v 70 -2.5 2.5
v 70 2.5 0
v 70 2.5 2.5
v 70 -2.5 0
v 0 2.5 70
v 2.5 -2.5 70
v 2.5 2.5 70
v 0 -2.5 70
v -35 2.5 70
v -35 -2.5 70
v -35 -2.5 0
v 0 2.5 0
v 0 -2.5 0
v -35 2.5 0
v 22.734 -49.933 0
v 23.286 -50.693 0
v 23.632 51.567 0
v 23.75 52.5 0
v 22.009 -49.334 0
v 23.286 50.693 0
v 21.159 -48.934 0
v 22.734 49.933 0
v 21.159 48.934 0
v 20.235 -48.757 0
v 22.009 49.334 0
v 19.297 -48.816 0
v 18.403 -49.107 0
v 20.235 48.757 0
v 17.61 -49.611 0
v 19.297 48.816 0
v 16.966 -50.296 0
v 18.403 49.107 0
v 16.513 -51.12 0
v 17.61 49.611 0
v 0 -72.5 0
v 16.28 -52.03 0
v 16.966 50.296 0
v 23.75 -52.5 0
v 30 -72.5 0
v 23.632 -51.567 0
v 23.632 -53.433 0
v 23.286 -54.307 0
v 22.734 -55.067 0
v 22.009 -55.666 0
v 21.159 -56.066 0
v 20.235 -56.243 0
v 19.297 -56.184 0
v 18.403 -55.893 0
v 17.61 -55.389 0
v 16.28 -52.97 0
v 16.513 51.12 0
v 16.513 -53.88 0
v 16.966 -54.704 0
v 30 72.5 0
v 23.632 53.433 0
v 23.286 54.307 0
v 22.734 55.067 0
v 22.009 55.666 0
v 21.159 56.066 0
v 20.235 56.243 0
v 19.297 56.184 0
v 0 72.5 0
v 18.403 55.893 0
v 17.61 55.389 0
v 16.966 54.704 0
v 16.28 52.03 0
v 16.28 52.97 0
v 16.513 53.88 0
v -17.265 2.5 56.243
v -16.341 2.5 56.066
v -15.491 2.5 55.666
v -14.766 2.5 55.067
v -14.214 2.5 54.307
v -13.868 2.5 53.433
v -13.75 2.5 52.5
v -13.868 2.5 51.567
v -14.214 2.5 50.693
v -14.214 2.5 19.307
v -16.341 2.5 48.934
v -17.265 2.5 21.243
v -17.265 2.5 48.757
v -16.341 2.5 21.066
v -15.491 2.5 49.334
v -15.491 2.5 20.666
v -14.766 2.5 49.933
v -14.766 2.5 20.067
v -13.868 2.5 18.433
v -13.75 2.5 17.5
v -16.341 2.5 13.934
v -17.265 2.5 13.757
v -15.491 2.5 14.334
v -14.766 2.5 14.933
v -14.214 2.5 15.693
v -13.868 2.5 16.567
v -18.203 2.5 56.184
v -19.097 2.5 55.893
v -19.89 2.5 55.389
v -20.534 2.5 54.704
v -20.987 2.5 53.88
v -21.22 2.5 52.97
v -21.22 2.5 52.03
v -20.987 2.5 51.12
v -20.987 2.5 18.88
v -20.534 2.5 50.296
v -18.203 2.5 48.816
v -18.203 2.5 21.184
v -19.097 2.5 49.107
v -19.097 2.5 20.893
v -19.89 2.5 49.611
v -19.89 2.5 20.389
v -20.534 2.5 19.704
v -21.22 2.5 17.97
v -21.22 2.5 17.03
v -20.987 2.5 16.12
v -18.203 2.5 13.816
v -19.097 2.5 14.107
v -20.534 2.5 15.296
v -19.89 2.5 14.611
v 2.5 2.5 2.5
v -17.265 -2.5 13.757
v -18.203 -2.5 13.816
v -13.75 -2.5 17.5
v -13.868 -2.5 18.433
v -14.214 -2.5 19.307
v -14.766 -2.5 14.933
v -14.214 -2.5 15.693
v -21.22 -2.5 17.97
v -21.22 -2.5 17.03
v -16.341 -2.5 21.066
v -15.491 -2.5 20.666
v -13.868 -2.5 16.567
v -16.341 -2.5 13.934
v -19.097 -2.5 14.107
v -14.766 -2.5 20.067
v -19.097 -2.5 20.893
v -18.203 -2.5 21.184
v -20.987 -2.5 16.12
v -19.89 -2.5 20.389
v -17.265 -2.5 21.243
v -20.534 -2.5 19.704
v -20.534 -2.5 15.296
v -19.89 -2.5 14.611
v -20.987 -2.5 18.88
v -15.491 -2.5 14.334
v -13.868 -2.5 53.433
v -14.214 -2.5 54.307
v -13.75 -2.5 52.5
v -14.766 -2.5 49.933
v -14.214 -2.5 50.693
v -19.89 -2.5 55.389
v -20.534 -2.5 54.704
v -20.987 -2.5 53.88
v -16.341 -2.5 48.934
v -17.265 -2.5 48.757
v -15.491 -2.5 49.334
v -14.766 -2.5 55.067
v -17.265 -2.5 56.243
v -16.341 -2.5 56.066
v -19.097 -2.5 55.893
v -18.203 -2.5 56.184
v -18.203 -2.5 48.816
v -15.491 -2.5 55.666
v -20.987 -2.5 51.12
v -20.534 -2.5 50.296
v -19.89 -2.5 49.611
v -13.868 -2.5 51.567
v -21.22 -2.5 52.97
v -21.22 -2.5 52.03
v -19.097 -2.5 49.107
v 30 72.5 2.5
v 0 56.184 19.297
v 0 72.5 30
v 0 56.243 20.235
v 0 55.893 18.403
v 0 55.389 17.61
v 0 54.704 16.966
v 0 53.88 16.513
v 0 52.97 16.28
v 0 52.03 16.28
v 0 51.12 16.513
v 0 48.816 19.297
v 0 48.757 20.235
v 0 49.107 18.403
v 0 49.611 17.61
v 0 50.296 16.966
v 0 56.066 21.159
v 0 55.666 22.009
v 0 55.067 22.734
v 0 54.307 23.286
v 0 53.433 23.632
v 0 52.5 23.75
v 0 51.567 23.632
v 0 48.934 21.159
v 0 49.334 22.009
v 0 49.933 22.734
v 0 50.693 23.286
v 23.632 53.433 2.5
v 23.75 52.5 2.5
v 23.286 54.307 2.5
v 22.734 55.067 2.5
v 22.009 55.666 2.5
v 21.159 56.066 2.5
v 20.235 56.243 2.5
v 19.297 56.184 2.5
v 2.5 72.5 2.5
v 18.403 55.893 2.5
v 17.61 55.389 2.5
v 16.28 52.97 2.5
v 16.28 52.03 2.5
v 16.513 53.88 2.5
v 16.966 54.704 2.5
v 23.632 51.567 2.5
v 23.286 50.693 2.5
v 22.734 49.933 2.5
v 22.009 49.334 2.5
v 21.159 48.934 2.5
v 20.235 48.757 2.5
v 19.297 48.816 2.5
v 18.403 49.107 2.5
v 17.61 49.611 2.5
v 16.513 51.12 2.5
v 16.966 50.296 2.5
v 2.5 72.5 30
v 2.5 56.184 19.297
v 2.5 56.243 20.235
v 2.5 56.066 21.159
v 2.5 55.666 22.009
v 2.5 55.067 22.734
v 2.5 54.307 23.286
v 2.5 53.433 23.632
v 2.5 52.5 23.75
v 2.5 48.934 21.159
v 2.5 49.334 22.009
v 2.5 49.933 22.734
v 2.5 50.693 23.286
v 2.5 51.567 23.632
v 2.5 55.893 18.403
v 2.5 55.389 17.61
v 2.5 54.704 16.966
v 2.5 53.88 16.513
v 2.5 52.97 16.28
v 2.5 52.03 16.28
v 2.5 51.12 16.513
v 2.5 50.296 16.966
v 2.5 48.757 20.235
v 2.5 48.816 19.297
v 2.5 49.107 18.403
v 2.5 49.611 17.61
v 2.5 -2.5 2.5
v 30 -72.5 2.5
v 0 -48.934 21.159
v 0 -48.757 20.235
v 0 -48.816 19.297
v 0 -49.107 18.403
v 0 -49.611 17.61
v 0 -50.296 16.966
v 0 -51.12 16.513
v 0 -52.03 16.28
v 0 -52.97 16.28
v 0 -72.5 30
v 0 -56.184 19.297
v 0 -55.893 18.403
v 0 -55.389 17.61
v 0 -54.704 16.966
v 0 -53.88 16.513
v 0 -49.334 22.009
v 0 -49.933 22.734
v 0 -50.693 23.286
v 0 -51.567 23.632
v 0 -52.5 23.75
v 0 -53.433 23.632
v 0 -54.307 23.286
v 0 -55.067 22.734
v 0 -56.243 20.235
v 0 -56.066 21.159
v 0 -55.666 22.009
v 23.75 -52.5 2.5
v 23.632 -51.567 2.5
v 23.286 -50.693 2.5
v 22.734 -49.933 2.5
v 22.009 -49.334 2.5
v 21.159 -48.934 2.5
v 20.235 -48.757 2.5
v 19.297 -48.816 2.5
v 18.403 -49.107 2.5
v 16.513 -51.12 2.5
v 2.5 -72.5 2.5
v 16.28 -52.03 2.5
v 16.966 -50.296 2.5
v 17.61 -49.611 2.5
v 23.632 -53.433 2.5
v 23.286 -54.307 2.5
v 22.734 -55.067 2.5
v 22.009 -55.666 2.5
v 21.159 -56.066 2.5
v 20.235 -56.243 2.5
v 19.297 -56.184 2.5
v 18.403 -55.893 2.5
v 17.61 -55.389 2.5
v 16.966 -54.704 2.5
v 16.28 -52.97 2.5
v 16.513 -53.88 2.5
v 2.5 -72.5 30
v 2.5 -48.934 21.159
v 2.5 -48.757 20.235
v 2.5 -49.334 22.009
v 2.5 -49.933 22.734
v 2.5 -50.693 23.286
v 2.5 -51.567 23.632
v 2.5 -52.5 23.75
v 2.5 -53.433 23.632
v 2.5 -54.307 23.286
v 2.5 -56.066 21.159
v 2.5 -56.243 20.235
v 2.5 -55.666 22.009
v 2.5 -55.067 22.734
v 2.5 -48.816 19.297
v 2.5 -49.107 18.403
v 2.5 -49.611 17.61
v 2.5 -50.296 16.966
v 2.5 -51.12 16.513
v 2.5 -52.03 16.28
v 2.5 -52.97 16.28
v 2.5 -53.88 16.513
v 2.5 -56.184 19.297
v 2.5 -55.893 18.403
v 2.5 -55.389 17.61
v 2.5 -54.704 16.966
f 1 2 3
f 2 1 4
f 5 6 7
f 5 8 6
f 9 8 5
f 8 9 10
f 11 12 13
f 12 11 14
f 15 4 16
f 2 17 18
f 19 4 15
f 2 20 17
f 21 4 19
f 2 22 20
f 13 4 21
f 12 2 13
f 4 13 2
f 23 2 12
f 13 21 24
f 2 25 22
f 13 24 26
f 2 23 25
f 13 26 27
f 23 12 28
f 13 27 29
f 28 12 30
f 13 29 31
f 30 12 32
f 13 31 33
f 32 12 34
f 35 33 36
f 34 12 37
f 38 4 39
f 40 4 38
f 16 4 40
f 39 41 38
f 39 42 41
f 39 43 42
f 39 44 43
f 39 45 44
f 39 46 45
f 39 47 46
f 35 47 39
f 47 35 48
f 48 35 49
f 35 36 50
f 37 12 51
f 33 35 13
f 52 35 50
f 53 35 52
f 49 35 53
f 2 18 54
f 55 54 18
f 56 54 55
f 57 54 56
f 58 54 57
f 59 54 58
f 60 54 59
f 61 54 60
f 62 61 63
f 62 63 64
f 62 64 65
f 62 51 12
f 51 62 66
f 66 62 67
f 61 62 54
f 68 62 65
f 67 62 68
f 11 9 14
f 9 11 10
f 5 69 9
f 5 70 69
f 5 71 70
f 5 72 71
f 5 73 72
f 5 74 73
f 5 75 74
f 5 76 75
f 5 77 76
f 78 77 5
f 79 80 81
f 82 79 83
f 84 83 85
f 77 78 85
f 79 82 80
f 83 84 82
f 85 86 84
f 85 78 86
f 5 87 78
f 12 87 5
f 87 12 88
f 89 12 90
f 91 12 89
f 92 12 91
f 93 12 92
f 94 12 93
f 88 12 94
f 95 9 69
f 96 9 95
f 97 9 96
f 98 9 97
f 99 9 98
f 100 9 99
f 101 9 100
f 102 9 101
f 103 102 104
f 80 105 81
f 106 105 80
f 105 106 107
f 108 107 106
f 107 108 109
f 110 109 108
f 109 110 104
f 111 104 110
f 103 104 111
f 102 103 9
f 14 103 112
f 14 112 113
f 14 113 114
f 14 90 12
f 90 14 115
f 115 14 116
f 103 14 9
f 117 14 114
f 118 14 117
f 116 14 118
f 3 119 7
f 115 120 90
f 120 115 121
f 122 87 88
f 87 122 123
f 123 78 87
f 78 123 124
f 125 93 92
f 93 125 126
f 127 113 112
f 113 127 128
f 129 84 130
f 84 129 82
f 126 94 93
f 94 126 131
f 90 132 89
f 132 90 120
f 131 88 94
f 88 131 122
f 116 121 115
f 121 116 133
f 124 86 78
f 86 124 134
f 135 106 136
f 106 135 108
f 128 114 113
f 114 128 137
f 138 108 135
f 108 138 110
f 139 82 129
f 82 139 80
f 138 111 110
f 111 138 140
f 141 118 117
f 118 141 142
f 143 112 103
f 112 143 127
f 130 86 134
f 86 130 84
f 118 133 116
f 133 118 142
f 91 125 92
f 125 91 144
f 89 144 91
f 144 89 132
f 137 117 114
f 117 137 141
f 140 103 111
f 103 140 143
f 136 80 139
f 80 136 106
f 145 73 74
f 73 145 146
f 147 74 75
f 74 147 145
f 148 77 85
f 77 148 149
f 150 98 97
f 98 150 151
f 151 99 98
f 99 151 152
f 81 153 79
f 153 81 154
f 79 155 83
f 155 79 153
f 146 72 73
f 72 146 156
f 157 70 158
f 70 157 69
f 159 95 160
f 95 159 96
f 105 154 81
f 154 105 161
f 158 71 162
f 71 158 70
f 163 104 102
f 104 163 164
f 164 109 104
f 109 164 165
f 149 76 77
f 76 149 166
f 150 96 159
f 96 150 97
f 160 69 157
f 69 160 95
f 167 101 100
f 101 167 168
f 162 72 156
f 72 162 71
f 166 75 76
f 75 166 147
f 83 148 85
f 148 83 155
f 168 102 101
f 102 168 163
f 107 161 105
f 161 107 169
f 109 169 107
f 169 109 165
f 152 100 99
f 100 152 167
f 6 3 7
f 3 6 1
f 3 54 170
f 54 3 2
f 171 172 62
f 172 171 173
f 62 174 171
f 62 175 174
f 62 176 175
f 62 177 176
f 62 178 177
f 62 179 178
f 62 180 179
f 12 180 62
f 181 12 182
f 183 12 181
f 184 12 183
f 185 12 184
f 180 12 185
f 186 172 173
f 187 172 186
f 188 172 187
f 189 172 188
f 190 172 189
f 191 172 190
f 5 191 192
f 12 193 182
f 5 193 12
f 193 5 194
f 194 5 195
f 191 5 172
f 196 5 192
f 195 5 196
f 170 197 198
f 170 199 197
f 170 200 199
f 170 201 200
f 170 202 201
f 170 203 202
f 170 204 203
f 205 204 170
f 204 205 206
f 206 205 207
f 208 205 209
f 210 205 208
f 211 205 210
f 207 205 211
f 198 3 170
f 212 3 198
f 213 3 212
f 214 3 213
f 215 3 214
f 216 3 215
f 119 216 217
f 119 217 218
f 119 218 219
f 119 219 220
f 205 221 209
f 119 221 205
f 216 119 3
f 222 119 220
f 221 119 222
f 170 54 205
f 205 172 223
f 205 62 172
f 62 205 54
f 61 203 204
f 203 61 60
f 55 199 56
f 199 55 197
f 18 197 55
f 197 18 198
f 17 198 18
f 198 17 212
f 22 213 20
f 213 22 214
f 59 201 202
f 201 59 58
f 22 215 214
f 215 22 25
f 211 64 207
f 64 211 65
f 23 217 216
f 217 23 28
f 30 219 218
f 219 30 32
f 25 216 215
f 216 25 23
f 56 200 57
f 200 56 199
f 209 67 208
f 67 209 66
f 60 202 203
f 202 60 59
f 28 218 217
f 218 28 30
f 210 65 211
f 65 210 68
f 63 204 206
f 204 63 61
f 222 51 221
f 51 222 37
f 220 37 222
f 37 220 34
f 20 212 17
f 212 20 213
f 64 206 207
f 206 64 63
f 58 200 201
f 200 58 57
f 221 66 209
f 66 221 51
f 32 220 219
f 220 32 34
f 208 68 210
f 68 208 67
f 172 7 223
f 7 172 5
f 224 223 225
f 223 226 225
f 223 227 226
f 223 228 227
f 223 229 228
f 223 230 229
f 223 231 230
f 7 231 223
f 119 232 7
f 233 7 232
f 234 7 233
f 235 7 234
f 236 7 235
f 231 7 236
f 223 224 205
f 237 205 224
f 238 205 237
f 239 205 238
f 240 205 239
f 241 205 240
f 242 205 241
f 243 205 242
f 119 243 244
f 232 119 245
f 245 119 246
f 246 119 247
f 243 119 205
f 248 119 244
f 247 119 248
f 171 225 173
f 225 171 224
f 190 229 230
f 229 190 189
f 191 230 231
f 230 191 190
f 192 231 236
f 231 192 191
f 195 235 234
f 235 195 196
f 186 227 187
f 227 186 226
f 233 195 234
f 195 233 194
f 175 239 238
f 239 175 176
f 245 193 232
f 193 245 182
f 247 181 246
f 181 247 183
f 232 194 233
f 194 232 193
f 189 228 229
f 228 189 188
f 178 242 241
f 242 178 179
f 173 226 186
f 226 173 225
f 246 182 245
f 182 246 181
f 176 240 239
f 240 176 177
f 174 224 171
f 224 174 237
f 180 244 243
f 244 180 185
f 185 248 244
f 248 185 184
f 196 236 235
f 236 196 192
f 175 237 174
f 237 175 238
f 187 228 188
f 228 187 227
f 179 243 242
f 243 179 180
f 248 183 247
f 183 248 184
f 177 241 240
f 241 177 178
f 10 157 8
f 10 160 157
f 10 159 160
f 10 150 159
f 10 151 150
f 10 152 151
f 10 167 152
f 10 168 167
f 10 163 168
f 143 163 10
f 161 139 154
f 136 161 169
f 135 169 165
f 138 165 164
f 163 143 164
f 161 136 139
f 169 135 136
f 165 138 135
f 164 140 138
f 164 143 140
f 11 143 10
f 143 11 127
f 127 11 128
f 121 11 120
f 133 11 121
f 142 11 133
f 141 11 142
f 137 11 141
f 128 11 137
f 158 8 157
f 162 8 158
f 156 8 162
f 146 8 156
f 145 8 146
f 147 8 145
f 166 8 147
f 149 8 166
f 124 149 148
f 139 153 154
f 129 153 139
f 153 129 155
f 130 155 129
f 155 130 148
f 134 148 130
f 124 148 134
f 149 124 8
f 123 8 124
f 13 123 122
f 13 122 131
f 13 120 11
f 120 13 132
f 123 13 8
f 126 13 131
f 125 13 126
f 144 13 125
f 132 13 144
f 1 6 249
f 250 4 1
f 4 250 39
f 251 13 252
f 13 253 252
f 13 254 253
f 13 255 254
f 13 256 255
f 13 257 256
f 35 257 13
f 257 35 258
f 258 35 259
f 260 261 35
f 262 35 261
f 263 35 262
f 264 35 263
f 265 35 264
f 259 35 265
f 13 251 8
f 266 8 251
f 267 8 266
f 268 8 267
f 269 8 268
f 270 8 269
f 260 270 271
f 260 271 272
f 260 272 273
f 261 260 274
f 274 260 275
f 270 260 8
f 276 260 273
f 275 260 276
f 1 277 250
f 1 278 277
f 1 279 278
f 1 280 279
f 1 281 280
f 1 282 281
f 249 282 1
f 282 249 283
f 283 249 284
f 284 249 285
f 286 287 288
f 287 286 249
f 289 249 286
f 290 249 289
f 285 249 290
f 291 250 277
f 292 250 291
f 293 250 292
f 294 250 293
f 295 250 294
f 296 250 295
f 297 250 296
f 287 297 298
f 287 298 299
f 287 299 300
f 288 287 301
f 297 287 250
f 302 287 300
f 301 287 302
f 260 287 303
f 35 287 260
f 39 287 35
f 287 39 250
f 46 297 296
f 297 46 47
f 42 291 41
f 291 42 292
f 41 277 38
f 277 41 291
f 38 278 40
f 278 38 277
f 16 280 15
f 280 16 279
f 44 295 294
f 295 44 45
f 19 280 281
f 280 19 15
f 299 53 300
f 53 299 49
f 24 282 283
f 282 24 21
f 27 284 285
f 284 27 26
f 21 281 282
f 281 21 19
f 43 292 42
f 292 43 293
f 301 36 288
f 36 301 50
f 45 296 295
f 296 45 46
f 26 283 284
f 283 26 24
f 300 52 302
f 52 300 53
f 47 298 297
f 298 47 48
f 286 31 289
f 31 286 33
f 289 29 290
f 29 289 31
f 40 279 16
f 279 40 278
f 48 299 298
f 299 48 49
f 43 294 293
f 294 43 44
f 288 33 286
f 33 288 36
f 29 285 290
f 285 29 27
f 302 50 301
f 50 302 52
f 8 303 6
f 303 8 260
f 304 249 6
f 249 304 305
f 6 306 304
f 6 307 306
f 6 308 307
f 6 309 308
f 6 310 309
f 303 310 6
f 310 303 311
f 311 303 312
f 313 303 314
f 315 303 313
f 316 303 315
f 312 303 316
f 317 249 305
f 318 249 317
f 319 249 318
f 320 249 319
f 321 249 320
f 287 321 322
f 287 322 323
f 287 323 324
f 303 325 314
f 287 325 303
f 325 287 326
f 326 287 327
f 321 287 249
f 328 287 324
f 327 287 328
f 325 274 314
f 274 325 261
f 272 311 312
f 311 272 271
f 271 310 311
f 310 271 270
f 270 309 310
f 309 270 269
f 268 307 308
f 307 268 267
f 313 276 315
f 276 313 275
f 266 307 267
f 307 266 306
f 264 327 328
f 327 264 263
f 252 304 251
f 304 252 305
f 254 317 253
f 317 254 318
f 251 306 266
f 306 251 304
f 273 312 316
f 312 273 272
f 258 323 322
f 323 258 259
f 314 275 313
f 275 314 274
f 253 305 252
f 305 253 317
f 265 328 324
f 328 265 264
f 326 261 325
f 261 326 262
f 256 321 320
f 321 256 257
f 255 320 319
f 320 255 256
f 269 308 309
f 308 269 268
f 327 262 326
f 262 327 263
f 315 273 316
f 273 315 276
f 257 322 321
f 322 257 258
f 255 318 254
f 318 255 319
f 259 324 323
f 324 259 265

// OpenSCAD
$fn = 25;

height = 70;
base_width = 70;
thickness = 2.5;
washer_diameter = 30;
top_width = washer_diameter;

screw_hole_diameter = 7.5;
hook_hole_diameter = 7.5;

washer_edge_spacing = thickness * 2 + washer_diameter / 2;

module side_profile() {
  points = [
    [0, 0],
    [base_width, 0],
    [top_width, height],
    [0, height],
  ];
  difference() {
    linear_extrude(thickness)
      polygon(points);

    translate([washer_edge_spacing, height - washer_edge_spacing, 0])
      hook_hole();
  }
}

module hook_hole() {
  cylinder(
    thickness,
    r1=hook_hole_diameter / 2,
    r2=hook_hole_diameter / 2
  );
}

module screw_hole() {
  cylinder(
    thickness,
    d=screw_hole_diameter
  );
}

module base() {
  difference() {
    cube([base_width * 1.5, thickness, base_width]);

    translate([(base_width / 4), thickness, (base_width / 4)])
      rotate(90, [1, 0, 0])
        screw_hole();

    translate([(base_width / 4), thickness, 3 * (base_width / 4)])
      rotate(90, [1, 0, 0])
        screw_hole();

    translate([base_width / 2, thickness, 0])
      rotate(90, [1, 0, 0])
        linear_extrude(thickness)
          polygon(
            [
              [thickness, base_width],
              [base_width, thickness],
              [base_width, base_width]
            ]
          );
  }
}

module assemble() {
  translate([-base_width / 2, 0, 0])
    base();

  translate([0, thickness, 0])
    side_profile();

  translate([thickness, thickness, 0])
    rotate(270, [0, 1, 0])
      side_profile();
}

// base();
assemble();
mirror([0, 1, 0])
  assemble();
